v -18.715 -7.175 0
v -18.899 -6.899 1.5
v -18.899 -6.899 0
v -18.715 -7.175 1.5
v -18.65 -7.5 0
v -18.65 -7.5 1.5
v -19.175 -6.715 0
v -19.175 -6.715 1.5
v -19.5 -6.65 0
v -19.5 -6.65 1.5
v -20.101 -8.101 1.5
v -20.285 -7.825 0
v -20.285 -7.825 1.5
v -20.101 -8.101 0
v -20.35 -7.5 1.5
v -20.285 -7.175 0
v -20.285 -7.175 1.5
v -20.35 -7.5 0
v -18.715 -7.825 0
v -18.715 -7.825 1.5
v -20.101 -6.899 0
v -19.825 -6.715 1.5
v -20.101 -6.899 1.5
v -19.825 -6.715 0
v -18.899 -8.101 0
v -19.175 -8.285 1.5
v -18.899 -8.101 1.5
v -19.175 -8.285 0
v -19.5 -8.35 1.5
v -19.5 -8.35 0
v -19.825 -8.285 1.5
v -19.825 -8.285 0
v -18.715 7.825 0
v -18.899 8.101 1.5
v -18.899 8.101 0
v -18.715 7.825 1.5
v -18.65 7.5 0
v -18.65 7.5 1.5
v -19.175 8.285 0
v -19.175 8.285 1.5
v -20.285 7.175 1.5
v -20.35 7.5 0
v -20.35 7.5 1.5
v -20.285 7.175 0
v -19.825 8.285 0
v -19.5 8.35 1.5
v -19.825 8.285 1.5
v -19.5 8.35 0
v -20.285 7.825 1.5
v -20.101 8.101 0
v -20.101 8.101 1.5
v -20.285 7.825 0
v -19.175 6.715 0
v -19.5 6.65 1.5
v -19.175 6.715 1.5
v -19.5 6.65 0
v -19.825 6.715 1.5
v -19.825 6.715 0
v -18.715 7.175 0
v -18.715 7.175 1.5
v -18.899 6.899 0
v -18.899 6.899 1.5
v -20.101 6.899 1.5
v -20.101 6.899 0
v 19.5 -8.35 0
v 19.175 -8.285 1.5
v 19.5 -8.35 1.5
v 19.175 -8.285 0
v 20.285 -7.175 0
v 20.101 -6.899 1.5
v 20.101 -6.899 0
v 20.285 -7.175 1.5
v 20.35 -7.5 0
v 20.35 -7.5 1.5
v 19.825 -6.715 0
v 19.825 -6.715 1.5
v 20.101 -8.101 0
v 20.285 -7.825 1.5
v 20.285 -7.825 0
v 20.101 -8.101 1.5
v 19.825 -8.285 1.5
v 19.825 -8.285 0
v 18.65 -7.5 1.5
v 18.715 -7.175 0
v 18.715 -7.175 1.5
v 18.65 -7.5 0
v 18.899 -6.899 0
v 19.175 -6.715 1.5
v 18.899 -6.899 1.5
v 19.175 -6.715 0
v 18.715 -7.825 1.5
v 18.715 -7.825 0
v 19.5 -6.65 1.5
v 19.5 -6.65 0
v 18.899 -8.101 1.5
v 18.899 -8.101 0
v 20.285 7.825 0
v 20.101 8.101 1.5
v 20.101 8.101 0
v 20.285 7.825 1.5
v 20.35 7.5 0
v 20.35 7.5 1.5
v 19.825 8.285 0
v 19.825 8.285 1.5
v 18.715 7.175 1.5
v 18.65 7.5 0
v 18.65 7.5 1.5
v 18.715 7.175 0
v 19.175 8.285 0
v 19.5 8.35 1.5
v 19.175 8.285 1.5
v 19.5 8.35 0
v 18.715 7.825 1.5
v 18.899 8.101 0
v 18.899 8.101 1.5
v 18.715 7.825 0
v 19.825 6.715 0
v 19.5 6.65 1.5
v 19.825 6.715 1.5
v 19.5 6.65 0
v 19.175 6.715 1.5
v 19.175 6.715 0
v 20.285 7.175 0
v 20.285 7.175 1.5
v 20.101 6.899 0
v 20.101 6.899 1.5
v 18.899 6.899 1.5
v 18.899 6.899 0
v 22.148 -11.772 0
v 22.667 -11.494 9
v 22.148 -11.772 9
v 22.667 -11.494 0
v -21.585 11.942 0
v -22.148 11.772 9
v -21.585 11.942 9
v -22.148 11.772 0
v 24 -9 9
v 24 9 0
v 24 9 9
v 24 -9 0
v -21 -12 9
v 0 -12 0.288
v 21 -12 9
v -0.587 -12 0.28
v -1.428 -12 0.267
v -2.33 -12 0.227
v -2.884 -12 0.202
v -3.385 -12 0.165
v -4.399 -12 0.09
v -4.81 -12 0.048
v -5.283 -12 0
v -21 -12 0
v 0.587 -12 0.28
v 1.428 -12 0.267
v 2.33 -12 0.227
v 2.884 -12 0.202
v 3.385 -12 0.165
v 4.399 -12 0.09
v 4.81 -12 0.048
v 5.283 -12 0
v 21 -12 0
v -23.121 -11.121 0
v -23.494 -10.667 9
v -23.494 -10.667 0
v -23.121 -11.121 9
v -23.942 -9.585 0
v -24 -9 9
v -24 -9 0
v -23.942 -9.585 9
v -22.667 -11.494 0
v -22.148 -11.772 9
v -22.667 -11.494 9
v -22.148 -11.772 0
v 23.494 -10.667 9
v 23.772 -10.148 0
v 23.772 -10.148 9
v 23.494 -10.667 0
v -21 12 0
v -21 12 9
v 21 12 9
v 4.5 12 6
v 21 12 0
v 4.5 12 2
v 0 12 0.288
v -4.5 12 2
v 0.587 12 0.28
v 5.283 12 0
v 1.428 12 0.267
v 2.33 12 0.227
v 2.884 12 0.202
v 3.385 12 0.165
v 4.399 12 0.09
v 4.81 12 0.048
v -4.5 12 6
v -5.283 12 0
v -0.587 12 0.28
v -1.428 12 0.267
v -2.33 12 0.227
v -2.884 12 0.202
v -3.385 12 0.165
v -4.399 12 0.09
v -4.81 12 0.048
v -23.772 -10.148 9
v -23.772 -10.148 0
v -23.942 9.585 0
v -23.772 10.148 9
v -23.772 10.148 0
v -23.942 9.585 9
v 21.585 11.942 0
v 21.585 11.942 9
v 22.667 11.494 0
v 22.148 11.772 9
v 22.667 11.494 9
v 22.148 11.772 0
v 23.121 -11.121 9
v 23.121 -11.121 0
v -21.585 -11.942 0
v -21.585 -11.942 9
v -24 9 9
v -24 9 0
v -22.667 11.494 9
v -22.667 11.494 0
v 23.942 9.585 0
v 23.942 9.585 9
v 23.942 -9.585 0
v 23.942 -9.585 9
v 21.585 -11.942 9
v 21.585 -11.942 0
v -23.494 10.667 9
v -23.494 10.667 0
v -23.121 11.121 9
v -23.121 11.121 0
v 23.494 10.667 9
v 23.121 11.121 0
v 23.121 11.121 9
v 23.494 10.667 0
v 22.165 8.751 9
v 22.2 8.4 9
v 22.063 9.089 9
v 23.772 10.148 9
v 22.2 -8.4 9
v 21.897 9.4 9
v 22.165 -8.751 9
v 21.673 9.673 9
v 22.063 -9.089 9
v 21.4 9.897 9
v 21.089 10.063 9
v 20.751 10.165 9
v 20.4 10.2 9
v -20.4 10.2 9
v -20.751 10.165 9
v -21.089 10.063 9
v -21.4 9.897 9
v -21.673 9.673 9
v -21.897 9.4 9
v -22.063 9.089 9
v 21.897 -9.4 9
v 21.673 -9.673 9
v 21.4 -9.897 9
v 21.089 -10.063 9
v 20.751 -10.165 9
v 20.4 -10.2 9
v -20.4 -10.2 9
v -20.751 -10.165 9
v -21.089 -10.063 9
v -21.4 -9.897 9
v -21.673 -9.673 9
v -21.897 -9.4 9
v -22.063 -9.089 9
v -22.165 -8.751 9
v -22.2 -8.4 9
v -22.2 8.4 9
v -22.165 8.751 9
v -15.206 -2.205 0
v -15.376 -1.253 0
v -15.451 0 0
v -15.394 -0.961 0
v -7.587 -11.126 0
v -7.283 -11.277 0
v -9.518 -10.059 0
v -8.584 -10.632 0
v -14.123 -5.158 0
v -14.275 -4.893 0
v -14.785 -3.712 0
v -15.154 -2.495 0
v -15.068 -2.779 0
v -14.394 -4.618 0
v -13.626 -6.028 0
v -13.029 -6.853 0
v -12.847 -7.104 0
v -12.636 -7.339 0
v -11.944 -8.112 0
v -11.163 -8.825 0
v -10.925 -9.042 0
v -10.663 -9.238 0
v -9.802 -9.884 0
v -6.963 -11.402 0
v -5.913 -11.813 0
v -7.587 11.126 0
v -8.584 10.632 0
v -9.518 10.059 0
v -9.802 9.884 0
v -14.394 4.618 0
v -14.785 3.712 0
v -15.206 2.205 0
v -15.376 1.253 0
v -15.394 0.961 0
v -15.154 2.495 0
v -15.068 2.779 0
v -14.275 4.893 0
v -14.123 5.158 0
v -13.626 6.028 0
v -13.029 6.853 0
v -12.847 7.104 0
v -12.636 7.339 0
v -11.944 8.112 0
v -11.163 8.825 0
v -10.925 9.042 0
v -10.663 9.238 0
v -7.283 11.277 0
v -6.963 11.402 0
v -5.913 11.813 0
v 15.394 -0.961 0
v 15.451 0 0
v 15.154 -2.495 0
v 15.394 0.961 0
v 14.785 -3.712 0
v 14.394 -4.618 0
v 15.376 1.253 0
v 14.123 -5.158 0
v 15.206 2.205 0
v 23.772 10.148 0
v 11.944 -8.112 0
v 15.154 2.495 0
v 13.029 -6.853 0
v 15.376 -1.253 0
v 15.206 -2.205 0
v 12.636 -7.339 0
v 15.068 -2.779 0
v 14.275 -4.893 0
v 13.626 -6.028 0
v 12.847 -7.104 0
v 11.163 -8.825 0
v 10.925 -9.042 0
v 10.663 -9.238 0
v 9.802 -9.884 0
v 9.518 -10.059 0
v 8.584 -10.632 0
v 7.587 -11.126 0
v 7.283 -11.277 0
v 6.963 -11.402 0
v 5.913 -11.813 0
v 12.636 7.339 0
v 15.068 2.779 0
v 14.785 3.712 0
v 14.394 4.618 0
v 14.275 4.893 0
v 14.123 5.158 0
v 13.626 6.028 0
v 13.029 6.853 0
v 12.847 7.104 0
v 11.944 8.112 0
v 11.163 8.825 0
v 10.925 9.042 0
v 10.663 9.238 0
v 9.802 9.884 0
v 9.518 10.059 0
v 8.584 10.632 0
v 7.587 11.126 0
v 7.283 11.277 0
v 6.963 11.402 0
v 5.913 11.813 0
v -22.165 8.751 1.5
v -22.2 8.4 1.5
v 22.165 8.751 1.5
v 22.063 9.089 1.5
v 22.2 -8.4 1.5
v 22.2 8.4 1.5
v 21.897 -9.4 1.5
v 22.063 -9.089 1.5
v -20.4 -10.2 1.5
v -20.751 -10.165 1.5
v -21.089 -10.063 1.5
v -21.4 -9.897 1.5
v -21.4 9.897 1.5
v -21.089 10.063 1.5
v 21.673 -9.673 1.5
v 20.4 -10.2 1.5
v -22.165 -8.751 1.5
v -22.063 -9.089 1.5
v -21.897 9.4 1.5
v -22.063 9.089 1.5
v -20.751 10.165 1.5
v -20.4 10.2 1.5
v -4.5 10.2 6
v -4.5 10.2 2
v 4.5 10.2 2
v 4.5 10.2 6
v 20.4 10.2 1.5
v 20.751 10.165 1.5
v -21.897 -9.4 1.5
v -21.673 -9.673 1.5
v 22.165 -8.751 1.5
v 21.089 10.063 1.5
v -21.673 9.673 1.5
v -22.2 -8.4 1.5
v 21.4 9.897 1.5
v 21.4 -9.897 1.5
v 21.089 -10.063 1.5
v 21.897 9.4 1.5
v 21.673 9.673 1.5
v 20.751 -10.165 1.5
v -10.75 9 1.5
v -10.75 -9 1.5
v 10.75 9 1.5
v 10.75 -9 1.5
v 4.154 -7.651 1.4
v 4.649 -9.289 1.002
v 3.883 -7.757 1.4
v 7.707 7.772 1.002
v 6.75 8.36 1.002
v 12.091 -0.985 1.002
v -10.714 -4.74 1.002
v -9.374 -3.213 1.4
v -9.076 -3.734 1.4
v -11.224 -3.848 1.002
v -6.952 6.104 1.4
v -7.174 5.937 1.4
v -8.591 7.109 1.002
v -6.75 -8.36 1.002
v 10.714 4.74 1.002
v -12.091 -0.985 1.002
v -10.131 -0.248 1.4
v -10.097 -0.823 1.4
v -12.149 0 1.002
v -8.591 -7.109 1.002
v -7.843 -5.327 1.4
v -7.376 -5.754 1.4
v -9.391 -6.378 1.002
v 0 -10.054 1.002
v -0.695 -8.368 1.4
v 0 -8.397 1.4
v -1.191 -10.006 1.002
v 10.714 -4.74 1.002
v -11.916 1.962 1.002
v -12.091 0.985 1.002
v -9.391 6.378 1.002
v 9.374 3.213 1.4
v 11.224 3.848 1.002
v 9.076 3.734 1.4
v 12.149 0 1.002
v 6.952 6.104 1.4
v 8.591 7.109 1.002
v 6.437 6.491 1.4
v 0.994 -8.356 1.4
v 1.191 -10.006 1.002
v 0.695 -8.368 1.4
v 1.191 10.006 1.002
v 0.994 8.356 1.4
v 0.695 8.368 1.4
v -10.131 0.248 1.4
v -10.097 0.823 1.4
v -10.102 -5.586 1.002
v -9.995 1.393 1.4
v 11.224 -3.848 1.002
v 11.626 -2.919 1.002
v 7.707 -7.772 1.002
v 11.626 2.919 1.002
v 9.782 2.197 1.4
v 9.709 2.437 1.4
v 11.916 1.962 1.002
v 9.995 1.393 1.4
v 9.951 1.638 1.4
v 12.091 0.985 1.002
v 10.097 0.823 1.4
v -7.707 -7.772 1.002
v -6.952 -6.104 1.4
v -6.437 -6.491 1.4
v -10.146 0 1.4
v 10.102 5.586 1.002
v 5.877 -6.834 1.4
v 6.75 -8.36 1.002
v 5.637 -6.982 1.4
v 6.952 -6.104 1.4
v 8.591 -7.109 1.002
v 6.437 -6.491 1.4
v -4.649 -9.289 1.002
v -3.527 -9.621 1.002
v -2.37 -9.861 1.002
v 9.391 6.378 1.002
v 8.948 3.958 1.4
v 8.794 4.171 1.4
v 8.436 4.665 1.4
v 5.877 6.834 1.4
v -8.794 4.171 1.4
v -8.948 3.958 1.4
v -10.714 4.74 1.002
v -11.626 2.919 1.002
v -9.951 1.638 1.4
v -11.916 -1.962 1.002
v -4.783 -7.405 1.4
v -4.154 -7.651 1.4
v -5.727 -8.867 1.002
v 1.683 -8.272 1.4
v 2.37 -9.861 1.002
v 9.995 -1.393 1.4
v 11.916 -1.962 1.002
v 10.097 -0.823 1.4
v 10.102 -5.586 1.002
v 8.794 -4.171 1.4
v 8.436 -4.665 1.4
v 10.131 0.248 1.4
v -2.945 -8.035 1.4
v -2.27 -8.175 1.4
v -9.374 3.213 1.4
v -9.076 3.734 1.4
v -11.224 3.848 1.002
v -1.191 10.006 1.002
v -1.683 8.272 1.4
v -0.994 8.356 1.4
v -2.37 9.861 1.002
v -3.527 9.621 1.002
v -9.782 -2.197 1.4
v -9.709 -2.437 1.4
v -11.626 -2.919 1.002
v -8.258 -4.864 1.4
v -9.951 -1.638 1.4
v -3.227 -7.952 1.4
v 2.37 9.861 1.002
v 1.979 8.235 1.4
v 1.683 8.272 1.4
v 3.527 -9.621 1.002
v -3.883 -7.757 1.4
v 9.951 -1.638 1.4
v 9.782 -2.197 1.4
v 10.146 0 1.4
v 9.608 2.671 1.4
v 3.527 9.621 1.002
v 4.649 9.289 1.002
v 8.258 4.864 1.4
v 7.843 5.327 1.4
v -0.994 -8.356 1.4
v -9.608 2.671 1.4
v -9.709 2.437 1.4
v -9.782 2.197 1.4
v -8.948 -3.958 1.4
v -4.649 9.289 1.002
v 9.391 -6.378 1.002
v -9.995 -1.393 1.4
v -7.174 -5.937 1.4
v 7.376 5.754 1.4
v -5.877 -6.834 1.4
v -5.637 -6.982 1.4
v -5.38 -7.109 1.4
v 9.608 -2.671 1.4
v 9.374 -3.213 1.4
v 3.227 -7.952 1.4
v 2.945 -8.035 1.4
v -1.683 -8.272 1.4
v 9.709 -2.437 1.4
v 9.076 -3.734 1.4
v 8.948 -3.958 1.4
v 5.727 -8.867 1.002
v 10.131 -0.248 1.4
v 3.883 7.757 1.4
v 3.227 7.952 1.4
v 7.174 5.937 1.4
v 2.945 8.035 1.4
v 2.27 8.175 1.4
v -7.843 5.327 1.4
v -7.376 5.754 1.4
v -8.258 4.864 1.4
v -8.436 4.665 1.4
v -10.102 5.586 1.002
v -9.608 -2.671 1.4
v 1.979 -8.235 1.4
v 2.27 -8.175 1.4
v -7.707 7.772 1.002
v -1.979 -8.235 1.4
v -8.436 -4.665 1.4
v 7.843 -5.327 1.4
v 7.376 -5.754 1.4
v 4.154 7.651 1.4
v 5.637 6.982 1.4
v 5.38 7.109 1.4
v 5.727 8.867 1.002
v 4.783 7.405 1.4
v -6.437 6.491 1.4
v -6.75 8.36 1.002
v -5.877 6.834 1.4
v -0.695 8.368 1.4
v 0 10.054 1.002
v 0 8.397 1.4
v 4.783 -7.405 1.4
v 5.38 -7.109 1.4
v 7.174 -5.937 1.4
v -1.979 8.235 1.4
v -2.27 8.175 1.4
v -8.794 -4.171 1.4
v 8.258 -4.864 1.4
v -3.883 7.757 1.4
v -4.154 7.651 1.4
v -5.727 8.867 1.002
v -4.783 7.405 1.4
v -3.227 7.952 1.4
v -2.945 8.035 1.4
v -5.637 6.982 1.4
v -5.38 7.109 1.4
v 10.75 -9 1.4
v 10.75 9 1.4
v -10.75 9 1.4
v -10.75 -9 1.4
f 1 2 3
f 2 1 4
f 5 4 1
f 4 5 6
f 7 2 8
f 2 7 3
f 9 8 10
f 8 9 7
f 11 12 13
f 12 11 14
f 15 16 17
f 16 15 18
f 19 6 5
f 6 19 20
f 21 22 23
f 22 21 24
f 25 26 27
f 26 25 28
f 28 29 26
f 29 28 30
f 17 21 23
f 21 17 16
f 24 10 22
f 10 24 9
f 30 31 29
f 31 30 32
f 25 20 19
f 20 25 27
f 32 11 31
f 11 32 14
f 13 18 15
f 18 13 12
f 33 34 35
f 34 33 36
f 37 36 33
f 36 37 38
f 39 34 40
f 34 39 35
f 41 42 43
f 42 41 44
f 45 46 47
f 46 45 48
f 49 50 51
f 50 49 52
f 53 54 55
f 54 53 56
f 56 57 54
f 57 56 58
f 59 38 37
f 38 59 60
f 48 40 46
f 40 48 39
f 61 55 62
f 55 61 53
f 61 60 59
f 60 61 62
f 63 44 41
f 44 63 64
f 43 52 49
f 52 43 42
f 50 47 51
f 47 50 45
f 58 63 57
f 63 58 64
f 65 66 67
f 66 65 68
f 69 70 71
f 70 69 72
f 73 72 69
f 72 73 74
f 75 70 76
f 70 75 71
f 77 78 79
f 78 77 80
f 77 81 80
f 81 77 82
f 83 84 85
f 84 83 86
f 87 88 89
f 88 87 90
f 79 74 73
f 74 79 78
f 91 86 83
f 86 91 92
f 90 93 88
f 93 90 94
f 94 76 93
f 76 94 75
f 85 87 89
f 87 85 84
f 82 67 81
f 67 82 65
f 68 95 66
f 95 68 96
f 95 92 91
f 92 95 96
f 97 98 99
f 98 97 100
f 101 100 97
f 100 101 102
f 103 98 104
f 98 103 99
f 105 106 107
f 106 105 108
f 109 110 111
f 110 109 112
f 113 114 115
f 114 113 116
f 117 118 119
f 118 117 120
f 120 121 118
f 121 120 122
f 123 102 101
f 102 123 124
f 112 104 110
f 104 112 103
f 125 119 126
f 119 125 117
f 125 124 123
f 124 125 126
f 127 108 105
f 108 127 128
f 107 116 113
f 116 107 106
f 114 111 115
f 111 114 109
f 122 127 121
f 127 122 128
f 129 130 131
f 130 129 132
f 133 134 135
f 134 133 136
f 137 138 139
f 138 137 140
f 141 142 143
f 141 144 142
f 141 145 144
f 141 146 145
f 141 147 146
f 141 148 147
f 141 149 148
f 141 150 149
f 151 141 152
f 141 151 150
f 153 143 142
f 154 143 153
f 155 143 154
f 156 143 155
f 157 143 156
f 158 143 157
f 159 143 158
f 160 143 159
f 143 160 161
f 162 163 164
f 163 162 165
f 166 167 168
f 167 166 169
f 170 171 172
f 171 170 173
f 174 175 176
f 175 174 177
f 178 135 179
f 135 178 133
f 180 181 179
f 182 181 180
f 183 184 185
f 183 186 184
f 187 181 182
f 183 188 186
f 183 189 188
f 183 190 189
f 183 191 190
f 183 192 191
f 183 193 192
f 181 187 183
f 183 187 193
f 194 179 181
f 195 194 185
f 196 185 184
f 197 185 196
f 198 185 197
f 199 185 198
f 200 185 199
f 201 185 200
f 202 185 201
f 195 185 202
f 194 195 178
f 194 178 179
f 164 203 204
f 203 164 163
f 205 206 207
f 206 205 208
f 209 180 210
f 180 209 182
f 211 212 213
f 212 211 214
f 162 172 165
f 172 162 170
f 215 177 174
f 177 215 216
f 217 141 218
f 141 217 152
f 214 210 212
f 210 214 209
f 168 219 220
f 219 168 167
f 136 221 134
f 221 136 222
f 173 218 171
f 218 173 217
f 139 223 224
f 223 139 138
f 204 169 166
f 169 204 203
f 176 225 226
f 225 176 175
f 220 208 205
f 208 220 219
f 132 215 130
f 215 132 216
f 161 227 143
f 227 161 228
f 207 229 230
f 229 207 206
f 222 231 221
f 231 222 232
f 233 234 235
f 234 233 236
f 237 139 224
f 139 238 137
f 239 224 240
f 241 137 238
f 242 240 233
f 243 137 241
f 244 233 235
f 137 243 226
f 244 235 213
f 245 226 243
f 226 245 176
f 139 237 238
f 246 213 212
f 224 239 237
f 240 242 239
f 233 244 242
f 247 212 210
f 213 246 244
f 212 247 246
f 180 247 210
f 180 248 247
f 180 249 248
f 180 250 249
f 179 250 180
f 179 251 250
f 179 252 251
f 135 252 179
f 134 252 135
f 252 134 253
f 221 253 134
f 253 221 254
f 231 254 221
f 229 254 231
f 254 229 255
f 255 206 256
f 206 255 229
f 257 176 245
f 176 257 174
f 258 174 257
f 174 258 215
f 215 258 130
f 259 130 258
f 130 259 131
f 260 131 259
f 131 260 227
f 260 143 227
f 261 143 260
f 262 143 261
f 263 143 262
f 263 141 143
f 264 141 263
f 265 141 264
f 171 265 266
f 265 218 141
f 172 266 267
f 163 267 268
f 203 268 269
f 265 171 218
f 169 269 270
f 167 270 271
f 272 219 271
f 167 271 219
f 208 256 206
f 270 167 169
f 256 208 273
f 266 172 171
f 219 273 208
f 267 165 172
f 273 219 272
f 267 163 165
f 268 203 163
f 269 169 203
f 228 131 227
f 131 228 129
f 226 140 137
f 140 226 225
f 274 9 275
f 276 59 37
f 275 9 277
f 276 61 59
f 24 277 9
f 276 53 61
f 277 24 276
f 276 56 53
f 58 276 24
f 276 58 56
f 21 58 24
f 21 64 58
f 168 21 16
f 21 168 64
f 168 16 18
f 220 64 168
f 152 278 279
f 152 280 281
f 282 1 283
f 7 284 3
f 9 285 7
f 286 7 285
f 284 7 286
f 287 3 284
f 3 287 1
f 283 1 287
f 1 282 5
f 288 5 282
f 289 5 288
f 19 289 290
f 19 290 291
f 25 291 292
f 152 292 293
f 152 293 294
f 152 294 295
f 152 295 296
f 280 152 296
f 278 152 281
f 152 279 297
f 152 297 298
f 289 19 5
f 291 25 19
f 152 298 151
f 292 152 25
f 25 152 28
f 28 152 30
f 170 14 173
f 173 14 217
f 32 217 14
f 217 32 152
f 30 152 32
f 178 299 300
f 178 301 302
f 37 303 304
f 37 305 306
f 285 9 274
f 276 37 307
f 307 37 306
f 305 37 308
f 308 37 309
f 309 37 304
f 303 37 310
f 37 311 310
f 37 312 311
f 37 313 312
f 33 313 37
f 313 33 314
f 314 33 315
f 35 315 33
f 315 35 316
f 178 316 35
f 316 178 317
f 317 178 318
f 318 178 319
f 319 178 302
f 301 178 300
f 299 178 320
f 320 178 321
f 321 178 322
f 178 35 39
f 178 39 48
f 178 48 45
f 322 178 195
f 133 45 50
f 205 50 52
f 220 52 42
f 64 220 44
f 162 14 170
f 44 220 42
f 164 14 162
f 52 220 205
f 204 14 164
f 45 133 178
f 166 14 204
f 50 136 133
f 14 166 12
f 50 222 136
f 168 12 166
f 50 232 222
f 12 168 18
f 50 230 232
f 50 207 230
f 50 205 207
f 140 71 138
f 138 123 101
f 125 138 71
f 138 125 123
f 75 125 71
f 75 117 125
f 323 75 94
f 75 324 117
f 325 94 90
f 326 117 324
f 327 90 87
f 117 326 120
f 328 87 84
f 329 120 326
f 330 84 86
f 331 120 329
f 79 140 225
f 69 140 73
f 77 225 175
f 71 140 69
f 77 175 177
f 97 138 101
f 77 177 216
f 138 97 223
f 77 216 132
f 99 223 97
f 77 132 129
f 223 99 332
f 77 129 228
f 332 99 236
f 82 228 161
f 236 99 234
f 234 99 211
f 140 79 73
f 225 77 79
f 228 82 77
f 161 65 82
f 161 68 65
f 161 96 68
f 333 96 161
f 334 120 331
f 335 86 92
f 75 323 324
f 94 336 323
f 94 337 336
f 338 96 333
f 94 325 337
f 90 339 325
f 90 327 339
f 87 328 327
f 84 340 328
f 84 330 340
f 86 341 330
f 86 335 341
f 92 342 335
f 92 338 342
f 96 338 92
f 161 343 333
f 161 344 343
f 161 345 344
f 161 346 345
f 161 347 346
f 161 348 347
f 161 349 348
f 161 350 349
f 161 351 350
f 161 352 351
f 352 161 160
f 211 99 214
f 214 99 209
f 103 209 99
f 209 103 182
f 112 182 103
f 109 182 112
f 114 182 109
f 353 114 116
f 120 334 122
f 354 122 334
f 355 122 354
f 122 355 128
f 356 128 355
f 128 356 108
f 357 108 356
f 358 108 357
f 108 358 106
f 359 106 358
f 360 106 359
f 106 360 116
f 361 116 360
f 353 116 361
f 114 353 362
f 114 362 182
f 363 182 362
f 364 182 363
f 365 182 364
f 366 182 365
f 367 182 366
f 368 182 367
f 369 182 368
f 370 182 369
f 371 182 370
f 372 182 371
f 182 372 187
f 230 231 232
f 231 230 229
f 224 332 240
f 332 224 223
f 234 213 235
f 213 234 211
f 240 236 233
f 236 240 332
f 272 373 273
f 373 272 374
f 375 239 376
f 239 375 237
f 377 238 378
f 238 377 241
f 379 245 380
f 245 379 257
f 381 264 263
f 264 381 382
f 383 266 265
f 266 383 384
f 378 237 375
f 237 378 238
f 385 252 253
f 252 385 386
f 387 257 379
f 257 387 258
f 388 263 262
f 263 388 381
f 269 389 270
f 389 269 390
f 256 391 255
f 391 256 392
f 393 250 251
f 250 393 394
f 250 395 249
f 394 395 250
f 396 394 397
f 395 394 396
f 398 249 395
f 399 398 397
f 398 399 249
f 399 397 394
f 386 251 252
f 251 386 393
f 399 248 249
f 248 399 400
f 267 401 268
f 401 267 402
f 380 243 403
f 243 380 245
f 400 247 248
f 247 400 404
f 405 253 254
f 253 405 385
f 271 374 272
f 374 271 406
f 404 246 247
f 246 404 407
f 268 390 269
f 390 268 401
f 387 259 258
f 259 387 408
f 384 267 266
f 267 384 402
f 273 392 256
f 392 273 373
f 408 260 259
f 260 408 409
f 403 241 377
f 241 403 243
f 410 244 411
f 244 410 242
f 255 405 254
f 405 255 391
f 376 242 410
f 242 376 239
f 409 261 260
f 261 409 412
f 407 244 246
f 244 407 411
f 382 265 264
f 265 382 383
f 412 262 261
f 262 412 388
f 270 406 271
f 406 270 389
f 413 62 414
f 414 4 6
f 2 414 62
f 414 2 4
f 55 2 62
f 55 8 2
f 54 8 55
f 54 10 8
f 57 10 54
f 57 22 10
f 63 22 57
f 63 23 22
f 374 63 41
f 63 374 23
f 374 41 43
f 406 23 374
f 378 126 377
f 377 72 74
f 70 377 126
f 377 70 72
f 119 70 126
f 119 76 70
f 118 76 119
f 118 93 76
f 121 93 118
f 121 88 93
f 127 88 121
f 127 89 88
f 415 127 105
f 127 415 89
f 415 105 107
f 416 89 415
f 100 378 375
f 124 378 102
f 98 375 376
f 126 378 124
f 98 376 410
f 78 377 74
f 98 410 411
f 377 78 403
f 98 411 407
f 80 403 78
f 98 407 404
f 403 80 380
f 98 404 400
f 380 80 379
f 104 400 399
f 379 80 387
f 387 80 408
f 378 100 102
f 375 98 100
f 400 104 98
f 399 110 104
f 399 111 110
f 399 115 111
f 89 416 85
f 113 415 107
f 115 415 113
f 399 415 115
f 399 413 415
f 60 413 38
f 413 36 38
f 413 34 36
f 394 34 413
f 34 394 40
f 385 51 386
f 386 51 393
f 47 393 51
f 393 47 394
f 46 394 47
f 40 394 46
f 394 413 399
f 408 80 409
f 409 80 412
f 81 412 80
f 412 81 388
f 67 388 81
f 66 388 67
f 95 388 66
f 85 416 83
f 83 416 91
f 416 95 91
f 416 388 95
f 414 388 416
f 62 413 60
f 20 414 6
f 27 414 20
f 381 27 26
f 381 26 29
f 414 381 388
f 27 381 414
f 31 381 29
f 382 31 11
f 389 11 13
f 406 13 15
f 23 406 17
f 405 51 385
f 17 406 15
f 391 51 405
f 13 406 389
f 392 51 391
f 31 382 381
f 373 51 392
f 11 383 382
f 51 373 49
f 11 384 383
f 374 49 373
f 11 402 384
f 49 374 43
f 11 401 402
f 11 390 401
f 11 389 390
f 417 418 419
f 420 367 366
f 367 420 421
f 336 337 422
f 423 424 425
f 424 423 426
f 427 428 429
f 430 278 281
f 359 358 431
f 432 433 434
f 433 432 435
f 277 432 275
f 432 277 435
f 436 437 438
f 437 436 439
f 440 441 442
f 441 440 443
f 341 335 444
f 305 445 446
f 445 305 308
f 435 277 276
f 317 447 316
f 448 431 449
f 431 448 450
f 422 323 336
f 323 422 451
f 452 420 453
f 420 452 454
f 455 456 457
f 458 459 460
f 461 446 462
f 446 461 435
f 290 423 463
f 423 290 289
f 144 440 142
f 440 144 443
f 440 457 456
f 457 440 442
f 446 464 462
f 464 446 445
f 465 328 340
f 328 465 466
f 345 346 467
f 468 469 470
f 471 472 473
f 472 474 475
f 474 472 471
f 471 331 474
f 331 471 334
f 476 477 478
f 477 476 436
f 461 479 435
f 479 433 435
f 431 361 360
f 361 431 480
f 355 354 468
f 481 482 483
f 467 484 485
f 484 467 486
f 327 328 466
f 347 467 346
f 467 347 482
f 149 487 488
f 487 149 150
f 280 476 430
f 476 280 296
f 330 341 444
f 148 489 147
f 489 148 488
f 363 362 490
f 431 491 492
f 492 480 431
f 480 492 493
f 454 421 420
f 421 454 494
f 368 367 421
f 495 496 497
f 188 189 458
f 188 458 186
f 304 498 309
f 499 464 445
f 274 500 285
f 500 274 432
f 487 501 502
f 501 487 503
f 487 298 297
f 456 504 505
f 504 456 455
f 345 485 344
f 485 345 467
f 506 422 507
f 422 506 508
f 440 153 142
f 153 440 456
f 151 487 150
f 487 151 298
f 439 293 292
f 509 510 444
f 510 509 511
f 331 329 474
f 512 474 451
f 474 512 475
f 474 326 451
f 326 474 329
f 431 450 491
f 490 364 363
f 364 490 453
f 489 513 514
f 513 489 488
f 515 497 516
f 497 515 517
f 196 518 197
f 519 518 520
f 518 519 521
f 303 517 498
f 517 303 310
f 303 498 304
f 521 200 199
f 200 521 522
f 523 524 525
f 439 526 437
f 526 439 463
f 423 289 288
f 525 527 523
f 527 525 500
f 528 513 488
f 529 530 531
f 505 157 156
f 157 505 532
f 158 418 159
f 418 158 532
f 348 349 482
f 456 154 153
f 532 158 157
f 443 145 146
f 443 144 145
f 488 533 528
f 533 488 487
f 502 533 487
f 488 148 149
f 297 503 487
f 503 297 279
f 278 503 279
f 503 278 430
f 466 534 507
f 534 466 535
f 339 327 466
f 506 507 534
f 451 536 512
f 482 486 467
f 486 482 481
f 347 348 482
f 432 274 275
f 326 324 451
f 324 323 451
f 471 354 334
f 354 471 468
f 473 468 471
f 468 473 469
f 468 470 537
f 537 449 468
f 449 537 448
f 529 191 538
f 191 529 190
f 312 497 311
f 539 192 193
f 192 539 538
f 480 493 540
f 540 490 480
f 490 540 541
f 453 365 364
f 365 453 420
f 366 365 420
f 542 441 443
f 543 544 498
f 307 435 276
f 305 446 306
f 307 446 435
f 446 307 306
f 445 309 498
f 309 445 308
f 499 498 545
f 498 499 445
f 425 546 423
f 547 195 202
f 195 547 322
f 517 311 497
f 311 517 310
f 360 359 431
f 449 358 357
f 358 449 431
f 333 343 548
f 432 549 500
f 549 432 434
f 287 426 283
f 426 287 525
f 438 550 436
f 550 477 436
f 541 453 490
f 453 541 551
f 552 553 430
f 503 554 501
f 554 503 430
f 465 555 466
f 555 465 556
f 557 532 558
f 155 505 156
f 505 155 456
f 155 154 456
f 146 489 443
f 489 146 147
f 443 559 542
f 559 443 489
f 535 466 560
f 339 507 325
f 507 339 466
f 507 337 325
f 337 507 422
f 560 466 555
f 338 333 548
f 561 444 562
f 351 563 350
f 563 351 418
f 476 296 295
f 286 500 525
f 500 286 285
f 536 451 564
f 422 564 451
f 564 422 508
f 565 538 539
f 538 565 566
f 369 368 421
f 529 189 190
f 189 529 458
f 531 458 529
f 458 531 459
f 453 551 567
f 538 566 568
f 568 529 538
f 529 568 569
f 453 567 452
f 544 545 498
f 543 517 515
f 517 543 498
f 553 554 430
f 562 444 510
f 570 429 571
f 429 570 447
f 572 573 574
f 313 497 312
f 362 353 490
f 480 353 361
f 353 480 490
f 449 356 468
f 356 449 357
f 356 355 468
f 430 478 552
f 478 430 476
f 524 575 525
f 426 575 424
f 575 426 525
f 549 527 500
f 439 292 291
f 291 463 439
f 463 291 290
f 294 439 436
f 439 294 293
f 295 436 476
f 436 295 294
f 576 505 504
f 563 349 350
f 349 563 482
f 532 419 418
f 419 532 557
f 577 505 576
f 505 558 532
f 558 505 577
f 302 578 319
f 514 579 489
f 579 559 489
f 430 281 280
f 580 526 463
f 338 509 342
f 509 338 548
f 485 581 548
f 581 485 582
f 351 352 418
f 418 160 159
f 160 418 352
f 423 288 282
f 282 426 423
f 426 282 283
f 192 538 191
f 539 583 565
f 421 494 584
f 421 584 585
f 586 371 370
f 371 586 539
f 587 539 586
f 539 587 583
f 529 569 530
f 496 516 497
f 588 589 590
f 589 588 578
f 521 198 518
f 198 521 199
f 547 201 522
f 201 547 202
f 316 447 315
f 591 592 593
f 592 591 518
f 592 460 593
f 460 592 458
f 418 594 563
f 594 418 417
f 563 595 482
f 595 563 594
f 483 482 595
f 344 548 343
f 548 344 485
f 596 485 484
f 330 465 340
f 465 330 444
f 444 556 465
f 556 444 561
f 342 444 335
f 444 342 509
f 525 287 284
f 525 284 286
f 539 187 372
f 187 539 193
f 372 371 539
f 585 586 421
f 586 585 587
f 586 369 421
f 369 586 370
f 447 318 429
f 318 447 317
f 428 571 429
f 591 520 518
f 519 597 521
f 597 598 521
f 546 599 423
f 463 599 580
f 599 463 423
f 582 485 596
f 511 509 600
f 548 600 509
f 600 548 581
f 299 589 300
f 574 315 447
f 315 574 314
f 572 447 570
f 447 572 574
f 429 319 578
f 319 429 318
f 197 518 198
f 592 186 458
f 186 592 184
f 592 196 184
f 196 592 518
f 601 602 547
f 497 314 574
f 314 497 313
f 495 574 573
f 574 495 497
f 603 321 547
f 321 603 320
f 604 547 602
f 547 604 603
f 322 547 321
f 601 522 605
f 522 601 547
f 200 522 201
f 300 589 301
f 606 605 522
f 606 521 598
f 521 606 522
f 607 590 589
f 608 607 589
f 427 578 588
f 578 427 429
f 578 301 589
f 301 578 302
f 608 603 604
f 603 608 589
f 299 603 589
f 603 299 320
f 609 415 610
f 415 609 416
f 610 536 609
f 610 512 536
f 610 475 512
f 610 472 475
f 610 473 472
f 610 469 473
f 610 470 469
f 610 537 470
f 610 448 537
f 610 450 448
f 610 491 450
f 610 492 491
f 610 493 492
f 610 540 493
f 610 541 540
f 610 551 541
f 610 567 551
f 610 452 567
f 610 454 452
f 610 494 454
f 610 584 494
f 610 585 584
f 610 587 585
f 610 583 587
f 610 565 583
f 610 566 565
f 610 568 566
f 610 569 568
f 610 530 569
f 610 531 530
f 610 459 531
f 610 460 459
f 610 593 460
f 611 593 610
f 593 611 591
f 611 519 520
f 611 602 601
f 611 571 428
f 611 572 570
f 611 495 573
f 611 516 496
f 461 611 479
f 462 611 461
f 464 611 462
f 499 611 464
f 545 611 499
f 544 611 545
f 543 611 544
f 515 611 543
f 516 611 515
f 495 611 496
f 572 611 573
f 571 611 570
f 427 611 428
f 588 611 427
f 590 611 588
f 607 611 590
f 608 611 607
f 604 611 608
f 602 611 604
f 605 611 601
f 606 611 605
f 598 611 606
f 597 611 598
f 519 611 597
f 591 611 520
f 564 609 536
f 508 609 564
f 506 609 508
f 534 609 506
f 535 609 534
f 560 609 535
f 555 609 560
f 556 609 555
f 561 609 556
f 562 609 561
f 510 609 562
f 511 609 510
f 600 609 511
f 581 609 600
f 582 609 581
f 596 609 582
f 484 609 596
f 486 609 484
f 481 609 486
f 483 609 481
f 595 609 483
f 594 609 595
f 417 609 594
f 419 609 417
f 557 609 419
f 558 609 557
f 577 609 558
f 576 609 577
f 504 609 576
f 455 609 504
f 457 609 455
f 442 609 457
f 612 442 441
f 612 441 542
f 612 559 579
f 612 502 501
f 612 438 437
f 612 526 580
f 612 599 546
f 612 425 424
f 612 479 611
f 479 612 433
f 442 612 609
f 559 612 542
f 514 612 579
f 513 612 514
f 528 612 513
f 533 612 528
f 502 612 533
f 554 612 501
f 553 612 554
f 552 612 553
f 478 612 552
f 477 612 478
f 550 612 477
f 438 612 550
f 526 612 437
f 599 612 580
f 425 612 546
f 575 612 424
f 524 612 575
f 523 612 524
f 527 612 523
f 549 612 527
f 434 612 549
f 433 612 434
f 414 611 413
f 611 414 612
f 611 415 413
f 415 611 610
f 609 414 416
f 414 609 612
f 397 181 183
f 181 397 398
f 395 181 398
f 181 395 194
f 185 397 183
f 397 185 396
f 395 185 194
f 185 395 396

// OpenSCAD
// ============================================================
// PickleScore™ Wristband Enclosure — v3.0
// Parametric OpenSCAD model
// Pill-shaped capsule, curved back, 20mm quick-release straps
// Two-piece clamshell: top shell + bottom shell
// ============================================================
// TWO DESIGN PROFILES — switch with DESIGN variable below:
//
//   DESIGN = "prototype"
//     46 × 30 × 12mm — WS2812B 8×8 LED matrix display
//     Fits current electronics stack for bench testing
//     Seeed XIAO ESP32-C3 + LiPo (charging built-in)
//
//   DESIGN = "slim"
//     48 × 24 × 13mm — 0.91" SSD1306 128×32 OLED display
//     Fitbit Inspire 3 form factor (39 × 18.6 × 11.75mm)
//     Production target — Phase 3 with custom PCB
//
// ============================================================
// PRINT SETTINGS:
//   Material:      TPU 95A
//   Layer height:  0.15mm for best surface quality
//   Infill:        30% gyroid
//   Supports:      None needed
//   Orientation:
//     Top shell   → print face-down (display window on bed)
//     Bottom shell → print curved-side-down (add brim)
// ============================================================
// TO USE:
//   SHOW = "assembly"    — full preview with component stack
//   SHOW = "top"         — top shell only  (export STL)
//   SHOW = "bottom"      — bottom shell only (export STL)
// ============================================================

DESIGN = "slim";  // "prototype" | "slim"
SHOW   = "bottom";   // "assembly"  | "top" | "bottom"

// ============================================================
// PROFILE PARAMETERS
// ============================================================

// ── Standard profile — WS2812B 8×8 LED matrix ──────────────
proto_body_len  = 46;   // mm — trimmed from 60mm
proto_body_wid  = 30;   // mm — driven by 28mm LED matrix
proto_body_thk  = 12;   // mm — slimmed from 14mm
proto_top_h     =  5.0; // mm — top shell (holds matrix)
proto_bot_h     =  7.0; // mm — bottom shell (holds battery)
proto_win_w     = 24;   // mm — window width
proto_win_h     = 18;   // mm — window height
proto_matrix_w  = 28;   // mm — LED matrix PCB width
proto_matrix_h  = 20;   // mm — LED matrix PCB height
proto_matrix_thk =  4;  // mm — PCB + LED stack height
proto_batt_len  = 35;   // mm — EEMB 403048 LiPo
proto_batt_wid  = 25;   // mm
proto_batt_thk  =  5;   // mm — battery + foam
proto_fillet_r  =  4.0; // mm
proto_vent_offset = 10; // mm

// ── Slim profile — 0.91" SSD1306 OLED 128×32 ────────────────
slim_body_len  = 48;   // mm — along arm; fits XIAO(21) + LiPo(25) stacked in z
slim_body_wid  = 24;   // mm — across wrist; minimum for XIAO 17.5mm + walls
slim_body_thk  = 13;   // mm — bot_h(9) + top_h(4) reference only
slim_top_h     =  4.0; // mm — OLED + face plate
slim_bot_h     =  9.0; // mm — floor(1.5) + XIAO(4) + LiPo(3.5) stacked
slim_win_w     = 24;   // mm — 0.91" active area (128px direction)
slim_win_h     =  8;   // mm — 0.91" active area (32px direction)
slim_matrix_w  = 38;   // mm — 0.91" OLED PCB length (along arm)
slim_matrix_h  = 12;   // mm — 0.91" OLED PCB width (across wrist)
slim_matrix_thk =  2;  // mm — PCB + glass stack height
slim_batt_len  = 31;   // mm — 301230 (30mm cell) + 1mm clearance
slim_batt_wid  = 13;   // mm — 12mm LiPo + 1mm clearance
slim_batt_thk  =  3.5; // mm — 3mm LiPo + 0.5mm clearance
slim_fillet_r  =  3.0; // mm
slim_vent_offset =  8; // mm

// ============================================================
// RESOLVED PARAMETERS (auto-set from DESIGN selection)
// ============================================================

body_len  = (DESIGN == "slim") ? slim_body_len  : proto_body_len;
body_wid  = (DESIGN == "slim") ? slim_body_wid  : proto_body_wid;
body_thk  = (DESIGN == "slim") ? slim_body_thk  : proto_body_thk;
top_h     = (DESIGN == "slim") ? slim_top_h     : proto_top_h;
bot_h     = (DESIGN == "slim") ? slim_bot_h     : proto_bot_h;
win_w     = (DESIGN == "slim") ? slim_win_w     : proto_win_w;
win_h     = (DESIGN == "slim") ? slim_win_h     : proto_win_h;
matrix_w  = (DESIGN == "slim") ? slim_matrix_w  : proto_matrix_w;
matrix_h  = (DESIGN == "slim") ? slim_matrix_h  : proto_matrix_h;
matrix_thk= (DESIGN == "slim") ? slim_matrix_thk: proto_matrix_thk;
batt_len  = (DESIGN == "slim") ? slim_batt_len  : proto_batt_len;
batt_wid  = (DESIGN == "slim") ? slim_batt_wid  : proto_batt_wid;
batt_thk  = (DESIGN == "slim") ? slim_batt_thk  : proto_batt_thk;
fillet_r  = (DESIGN == "slim") ? slim_fillet_r  : proto_fillet_r;
vent_offset=(DESIGN == "slim") ? slim_vent_offset: proto_vent_offset;

// ── Shared parameters ────────────────────────────────────────
wall_t    = 1.8;  // mm — outer wall (both profiles)
floor_t   = 1.5;  // mm — bottom floor
curve_sag = 2.5;  // mm — wrist concavity
win_r     = 2.5;  // mm — window corner radius
win_recess= 0.5;  // mm — window recess depth

/// ── Seeed XIAO ESP32-C3 pocket ────────────────────────────────
// Seeed XIAO ESP32-C3 — 21×17.5mm — built-in LiPo charging
esp_len   = 21.5; // Seeed XIAO ESP32-C3 + 0.5mm clearance
esp_wid   = 18.0; // Seeed XIAO ESP32-C3 + 0.5mm clearance
esp_thk   =  4.0; // XIAO + components clearance
usbc_w    =  9.0; // mm — USB-C port opening width
usbc_h    =  4.0; // mm — USB-C port opening height

// ── Strap lugs (20mm quick-release) ──────────────────────────
lug_wid    = 20;
lug_outer  = 22;
lug_thk    =  1.8;
lug_h      =  3.5; // mm — match top_h
lug_angle  =  0;
bar_r      =  0.9;
bar_offset =  4.0;

// ── Screw bosses (M1.6) ───────────────────────────────────────
boss_r     = 1.8;
boss_h     = 3.5;
screw_r    = 0.85;
boss_inset = 4.5;

// ── Vent slots ────────────────────────────────────────────────
vent_len = 8;
vent_wid = 1.8;

// ============================================================
// HELPERS
// ============================================================

module rounded_box(l, w, h, r) {
    hull() {
        for (sx = [-1,1], sy = [-1,1])
            translate([sx*(l/2-r), sy*(w/2-r), 0])
                cylinder(r=r, h=h, $fn=32);
    }
}

module rounded_window(w, h, r, depth) {
    hull() {
        for (sx = [-1,1], sy = [-1,1])
            translate([sx*(w/2-r), sy*(h/2-r), 0])
                cylinder(r=r, h=depth+0.2, $fn=24);
    }
}

module screw_boss(x, y, z_base) {
    translate([x, y, z_base])
        difference() {
            cylinder(r=boss_r, h=boss_h, $fn=24);
            cylinder(r=screw_r, h=boss_h+0.1, $fn=18);
        }
}

// ============================================================
// TOP SHELL
// ============================================================

module top_shell() {
    difference() {
        union() {
            rounded_box(body_len, body_wid, top_h, fillet_r);
            // Right lug
            translate([body_len/2, -(lug_outer/2), 0])
                cube([bar_offset + 2, lug_thk, lug_h]);
            translate([body_len/2, (lug_outer/2 - lug_thk), 0])
                cube([bar_offset + 2, lug_thk, lug_h]);
            // Left lug
            translate([-(body_len/2 + bar_offset + 2), -(lug_outer/2), 0])
                cube([bar_offset + 2, lug_thk, lug_h]);
            translate([-(body_len/2 + bar_offset + 2), (lug_outer/2 - lug_thk), 0])
                cube([bar_offset + 2, lug_thk, lug_h]);
        }

        // Interior hollow
        translate([0, 0, wall_t])
            rounded_box(body_len - 2*wall_t, body_wid - 2*wall_t,
                        top_h, fillet_r - 1.2);

        // Display window cutout
        translate([0, 0, -0.1])
            rounded_window(win_w, win_h, win_r, top_h + 0.2);

        // Window recess rim
        translate([0, 0, wall_t - win_recess])
            rounded_window(win_w + 1.5, win_h + 1.5, win_r + 0.8, win_recess + 0.2);

        // USB-C removed from top shell — see bottom shell side wall
    }

    // Screw bosses
    screw_boss(-body_len/2 + boss_inset, -body_wid/2 + boss_inset, wall_t);
    screw_boss( body_len/2 - boss_inset, -body_wid/2 + boss_inset, wall_t);
    screw_boss(-body_len/2 + boss_inset,  body_wid/2 - boss_inset, wall_t);
    screw_boss( body_len/2 - boss_inset,  body_wid/2 - boss_inset, wall_t);
}

// ============================================================
// BOTTOM SHELL
// ============================================================

module bottom_shell() {
    difference() {
        rounded_box(body_len, body_wid, bot_h, fillet_r);

        // Interior hollow
        translate([0, 0, floor_t])
            rounded_box(body_len - 2*wall_t, body_wid - 2*wall_t,
                        bot_h, fillet_r - 1.2);

        // Concave wrist curve
        translate([0, 0, -(curve_sag * 20 - curve_sag)])
            scale([1, body_len / (body_len + 10), 1])
                sphere(r = curve_sag * 20, $fn=64);

        // XIAO ESP32-C3 pocket
        translate([-esp_len/2, -esp_wid/2, floor_t - 0.1])
            cube([esp_len, esp_wid, esp_thk + 0.1]);

        // LiPo pocket — stacked above XIAO
        translate([-batt_len/2, -batt_wid/2, floor_t + esp_thk])
            cube([batt_len, batt_wid, batt_thk + 0.1]);

        // USB-C port — side wall (programs XIAO + charges LiPo)
        translate([-usbc_w/2, body_wid/2 - wall_t - 0.1, floor_t + 0.5])
            cube([usbc_w, wall_t + 0.3, usbc_h]);

        // Screw holes
        for (bx = [-1,1], by = [-1,1])
            translate([bx*(body_len/2 - boss_inset),
                       by*(body_wid/2 - boss_inset), -0.1])
                cylinder(r=screw_r, h=floor_t + 0.2, $fn=16);
    }
}

// ============================================================
// ASSEMBLY PREVIEW
// ============================================================

module assembly() {
    color("DimGray", 0.88)
        translate([0, 0, bot_h])
            top_shell();

    color("SlateGray", 0.82)
        bottom_shell();

    // Smoked acrylic window
    color("MidnightBlue", 0.35)
        translate([0, 0, bot_h + wall_t - win_recess])
            rounded_window(win_w, win_h, win_r, 1.2);

    // Display (LED matrix or OLED)
    color("ForestGreen", 0.8)
        translate([0, 0, bot_h + wall_t])
            cube([matrix_w, matrix_h, matrix_thk], center=true);

    // XIAO ESP32-C3 (bottom of interior)
    color("SaddleBrown", 0.8)
        translate([0, 0, floor_t + esp_thk/2])
            cube([esp_len, esp_wid, esp_thk], center=true);

    // LiPo battery (stacked above XIAO)
    color("Goldenrod", 0.75)
        translate([0, 0, floor_t + esp_thk + batt_thk/2])
            cube([batt_len, batt_wid, batt_thk], center=true);
}

// ============================================================
// RENDER
// ============================================================

if      (SHOW == "top")    top_shell();
else if (SHOW == "bottom") bottom_shell();
else                       assembly();

// ============================================================
// QUICK REFERENCE
// ============================================================
// PROTOTYPE profile (DESIGN = "prototype"):
//   Body:        46 × 30 × 12 mm
//   Window:      24 × 18 mm
//   Display:     WS2812B 8×8 LED matrix (28 × 20mm)
//   Battery:     EEMB 403048 LiPo (35 × 25 × 5mm)
//   ESP32:       SuperMini 22.5 × 18mm ← MEASURE YOURS, update esp_len/esp_wid
//
// SLIM profile (DESIGN = "slim"):
//   Body:        48 × 24 × 13mm  (along arm × across wrist × thick)
//   Window:      24 × 8mm  ← 0.91" 128×32 active area
//   Display:     0.91" SSD1306 OLED 128×32 — PCB 38×12mm, pins on short end
//   Battery:     301230 LiPo (3mm × 12mm × 30mm, ~90mAh) stacked above XIAO
//   XIAO:        ESP32-C3, 21×17.5mm — built-in LiPo charging via USB-C
//   USB-C:       Side wall (body_wid face) — programs + charges
//   Straps:      20mm quick-release spring bars
//   Material:    TPU 95A recommended
//   Assembly:    4× M1.6 screws
//
// SHARED:
//   Straps:      20mm quick-release spring bars
//   Assembly:    4× M1.6 screws
//   Wall:        1.8mm all sides
//   Wrist curve: 2.5mm concavity
//   USB-C:       9 × 4mm, right side
// ============================================================
